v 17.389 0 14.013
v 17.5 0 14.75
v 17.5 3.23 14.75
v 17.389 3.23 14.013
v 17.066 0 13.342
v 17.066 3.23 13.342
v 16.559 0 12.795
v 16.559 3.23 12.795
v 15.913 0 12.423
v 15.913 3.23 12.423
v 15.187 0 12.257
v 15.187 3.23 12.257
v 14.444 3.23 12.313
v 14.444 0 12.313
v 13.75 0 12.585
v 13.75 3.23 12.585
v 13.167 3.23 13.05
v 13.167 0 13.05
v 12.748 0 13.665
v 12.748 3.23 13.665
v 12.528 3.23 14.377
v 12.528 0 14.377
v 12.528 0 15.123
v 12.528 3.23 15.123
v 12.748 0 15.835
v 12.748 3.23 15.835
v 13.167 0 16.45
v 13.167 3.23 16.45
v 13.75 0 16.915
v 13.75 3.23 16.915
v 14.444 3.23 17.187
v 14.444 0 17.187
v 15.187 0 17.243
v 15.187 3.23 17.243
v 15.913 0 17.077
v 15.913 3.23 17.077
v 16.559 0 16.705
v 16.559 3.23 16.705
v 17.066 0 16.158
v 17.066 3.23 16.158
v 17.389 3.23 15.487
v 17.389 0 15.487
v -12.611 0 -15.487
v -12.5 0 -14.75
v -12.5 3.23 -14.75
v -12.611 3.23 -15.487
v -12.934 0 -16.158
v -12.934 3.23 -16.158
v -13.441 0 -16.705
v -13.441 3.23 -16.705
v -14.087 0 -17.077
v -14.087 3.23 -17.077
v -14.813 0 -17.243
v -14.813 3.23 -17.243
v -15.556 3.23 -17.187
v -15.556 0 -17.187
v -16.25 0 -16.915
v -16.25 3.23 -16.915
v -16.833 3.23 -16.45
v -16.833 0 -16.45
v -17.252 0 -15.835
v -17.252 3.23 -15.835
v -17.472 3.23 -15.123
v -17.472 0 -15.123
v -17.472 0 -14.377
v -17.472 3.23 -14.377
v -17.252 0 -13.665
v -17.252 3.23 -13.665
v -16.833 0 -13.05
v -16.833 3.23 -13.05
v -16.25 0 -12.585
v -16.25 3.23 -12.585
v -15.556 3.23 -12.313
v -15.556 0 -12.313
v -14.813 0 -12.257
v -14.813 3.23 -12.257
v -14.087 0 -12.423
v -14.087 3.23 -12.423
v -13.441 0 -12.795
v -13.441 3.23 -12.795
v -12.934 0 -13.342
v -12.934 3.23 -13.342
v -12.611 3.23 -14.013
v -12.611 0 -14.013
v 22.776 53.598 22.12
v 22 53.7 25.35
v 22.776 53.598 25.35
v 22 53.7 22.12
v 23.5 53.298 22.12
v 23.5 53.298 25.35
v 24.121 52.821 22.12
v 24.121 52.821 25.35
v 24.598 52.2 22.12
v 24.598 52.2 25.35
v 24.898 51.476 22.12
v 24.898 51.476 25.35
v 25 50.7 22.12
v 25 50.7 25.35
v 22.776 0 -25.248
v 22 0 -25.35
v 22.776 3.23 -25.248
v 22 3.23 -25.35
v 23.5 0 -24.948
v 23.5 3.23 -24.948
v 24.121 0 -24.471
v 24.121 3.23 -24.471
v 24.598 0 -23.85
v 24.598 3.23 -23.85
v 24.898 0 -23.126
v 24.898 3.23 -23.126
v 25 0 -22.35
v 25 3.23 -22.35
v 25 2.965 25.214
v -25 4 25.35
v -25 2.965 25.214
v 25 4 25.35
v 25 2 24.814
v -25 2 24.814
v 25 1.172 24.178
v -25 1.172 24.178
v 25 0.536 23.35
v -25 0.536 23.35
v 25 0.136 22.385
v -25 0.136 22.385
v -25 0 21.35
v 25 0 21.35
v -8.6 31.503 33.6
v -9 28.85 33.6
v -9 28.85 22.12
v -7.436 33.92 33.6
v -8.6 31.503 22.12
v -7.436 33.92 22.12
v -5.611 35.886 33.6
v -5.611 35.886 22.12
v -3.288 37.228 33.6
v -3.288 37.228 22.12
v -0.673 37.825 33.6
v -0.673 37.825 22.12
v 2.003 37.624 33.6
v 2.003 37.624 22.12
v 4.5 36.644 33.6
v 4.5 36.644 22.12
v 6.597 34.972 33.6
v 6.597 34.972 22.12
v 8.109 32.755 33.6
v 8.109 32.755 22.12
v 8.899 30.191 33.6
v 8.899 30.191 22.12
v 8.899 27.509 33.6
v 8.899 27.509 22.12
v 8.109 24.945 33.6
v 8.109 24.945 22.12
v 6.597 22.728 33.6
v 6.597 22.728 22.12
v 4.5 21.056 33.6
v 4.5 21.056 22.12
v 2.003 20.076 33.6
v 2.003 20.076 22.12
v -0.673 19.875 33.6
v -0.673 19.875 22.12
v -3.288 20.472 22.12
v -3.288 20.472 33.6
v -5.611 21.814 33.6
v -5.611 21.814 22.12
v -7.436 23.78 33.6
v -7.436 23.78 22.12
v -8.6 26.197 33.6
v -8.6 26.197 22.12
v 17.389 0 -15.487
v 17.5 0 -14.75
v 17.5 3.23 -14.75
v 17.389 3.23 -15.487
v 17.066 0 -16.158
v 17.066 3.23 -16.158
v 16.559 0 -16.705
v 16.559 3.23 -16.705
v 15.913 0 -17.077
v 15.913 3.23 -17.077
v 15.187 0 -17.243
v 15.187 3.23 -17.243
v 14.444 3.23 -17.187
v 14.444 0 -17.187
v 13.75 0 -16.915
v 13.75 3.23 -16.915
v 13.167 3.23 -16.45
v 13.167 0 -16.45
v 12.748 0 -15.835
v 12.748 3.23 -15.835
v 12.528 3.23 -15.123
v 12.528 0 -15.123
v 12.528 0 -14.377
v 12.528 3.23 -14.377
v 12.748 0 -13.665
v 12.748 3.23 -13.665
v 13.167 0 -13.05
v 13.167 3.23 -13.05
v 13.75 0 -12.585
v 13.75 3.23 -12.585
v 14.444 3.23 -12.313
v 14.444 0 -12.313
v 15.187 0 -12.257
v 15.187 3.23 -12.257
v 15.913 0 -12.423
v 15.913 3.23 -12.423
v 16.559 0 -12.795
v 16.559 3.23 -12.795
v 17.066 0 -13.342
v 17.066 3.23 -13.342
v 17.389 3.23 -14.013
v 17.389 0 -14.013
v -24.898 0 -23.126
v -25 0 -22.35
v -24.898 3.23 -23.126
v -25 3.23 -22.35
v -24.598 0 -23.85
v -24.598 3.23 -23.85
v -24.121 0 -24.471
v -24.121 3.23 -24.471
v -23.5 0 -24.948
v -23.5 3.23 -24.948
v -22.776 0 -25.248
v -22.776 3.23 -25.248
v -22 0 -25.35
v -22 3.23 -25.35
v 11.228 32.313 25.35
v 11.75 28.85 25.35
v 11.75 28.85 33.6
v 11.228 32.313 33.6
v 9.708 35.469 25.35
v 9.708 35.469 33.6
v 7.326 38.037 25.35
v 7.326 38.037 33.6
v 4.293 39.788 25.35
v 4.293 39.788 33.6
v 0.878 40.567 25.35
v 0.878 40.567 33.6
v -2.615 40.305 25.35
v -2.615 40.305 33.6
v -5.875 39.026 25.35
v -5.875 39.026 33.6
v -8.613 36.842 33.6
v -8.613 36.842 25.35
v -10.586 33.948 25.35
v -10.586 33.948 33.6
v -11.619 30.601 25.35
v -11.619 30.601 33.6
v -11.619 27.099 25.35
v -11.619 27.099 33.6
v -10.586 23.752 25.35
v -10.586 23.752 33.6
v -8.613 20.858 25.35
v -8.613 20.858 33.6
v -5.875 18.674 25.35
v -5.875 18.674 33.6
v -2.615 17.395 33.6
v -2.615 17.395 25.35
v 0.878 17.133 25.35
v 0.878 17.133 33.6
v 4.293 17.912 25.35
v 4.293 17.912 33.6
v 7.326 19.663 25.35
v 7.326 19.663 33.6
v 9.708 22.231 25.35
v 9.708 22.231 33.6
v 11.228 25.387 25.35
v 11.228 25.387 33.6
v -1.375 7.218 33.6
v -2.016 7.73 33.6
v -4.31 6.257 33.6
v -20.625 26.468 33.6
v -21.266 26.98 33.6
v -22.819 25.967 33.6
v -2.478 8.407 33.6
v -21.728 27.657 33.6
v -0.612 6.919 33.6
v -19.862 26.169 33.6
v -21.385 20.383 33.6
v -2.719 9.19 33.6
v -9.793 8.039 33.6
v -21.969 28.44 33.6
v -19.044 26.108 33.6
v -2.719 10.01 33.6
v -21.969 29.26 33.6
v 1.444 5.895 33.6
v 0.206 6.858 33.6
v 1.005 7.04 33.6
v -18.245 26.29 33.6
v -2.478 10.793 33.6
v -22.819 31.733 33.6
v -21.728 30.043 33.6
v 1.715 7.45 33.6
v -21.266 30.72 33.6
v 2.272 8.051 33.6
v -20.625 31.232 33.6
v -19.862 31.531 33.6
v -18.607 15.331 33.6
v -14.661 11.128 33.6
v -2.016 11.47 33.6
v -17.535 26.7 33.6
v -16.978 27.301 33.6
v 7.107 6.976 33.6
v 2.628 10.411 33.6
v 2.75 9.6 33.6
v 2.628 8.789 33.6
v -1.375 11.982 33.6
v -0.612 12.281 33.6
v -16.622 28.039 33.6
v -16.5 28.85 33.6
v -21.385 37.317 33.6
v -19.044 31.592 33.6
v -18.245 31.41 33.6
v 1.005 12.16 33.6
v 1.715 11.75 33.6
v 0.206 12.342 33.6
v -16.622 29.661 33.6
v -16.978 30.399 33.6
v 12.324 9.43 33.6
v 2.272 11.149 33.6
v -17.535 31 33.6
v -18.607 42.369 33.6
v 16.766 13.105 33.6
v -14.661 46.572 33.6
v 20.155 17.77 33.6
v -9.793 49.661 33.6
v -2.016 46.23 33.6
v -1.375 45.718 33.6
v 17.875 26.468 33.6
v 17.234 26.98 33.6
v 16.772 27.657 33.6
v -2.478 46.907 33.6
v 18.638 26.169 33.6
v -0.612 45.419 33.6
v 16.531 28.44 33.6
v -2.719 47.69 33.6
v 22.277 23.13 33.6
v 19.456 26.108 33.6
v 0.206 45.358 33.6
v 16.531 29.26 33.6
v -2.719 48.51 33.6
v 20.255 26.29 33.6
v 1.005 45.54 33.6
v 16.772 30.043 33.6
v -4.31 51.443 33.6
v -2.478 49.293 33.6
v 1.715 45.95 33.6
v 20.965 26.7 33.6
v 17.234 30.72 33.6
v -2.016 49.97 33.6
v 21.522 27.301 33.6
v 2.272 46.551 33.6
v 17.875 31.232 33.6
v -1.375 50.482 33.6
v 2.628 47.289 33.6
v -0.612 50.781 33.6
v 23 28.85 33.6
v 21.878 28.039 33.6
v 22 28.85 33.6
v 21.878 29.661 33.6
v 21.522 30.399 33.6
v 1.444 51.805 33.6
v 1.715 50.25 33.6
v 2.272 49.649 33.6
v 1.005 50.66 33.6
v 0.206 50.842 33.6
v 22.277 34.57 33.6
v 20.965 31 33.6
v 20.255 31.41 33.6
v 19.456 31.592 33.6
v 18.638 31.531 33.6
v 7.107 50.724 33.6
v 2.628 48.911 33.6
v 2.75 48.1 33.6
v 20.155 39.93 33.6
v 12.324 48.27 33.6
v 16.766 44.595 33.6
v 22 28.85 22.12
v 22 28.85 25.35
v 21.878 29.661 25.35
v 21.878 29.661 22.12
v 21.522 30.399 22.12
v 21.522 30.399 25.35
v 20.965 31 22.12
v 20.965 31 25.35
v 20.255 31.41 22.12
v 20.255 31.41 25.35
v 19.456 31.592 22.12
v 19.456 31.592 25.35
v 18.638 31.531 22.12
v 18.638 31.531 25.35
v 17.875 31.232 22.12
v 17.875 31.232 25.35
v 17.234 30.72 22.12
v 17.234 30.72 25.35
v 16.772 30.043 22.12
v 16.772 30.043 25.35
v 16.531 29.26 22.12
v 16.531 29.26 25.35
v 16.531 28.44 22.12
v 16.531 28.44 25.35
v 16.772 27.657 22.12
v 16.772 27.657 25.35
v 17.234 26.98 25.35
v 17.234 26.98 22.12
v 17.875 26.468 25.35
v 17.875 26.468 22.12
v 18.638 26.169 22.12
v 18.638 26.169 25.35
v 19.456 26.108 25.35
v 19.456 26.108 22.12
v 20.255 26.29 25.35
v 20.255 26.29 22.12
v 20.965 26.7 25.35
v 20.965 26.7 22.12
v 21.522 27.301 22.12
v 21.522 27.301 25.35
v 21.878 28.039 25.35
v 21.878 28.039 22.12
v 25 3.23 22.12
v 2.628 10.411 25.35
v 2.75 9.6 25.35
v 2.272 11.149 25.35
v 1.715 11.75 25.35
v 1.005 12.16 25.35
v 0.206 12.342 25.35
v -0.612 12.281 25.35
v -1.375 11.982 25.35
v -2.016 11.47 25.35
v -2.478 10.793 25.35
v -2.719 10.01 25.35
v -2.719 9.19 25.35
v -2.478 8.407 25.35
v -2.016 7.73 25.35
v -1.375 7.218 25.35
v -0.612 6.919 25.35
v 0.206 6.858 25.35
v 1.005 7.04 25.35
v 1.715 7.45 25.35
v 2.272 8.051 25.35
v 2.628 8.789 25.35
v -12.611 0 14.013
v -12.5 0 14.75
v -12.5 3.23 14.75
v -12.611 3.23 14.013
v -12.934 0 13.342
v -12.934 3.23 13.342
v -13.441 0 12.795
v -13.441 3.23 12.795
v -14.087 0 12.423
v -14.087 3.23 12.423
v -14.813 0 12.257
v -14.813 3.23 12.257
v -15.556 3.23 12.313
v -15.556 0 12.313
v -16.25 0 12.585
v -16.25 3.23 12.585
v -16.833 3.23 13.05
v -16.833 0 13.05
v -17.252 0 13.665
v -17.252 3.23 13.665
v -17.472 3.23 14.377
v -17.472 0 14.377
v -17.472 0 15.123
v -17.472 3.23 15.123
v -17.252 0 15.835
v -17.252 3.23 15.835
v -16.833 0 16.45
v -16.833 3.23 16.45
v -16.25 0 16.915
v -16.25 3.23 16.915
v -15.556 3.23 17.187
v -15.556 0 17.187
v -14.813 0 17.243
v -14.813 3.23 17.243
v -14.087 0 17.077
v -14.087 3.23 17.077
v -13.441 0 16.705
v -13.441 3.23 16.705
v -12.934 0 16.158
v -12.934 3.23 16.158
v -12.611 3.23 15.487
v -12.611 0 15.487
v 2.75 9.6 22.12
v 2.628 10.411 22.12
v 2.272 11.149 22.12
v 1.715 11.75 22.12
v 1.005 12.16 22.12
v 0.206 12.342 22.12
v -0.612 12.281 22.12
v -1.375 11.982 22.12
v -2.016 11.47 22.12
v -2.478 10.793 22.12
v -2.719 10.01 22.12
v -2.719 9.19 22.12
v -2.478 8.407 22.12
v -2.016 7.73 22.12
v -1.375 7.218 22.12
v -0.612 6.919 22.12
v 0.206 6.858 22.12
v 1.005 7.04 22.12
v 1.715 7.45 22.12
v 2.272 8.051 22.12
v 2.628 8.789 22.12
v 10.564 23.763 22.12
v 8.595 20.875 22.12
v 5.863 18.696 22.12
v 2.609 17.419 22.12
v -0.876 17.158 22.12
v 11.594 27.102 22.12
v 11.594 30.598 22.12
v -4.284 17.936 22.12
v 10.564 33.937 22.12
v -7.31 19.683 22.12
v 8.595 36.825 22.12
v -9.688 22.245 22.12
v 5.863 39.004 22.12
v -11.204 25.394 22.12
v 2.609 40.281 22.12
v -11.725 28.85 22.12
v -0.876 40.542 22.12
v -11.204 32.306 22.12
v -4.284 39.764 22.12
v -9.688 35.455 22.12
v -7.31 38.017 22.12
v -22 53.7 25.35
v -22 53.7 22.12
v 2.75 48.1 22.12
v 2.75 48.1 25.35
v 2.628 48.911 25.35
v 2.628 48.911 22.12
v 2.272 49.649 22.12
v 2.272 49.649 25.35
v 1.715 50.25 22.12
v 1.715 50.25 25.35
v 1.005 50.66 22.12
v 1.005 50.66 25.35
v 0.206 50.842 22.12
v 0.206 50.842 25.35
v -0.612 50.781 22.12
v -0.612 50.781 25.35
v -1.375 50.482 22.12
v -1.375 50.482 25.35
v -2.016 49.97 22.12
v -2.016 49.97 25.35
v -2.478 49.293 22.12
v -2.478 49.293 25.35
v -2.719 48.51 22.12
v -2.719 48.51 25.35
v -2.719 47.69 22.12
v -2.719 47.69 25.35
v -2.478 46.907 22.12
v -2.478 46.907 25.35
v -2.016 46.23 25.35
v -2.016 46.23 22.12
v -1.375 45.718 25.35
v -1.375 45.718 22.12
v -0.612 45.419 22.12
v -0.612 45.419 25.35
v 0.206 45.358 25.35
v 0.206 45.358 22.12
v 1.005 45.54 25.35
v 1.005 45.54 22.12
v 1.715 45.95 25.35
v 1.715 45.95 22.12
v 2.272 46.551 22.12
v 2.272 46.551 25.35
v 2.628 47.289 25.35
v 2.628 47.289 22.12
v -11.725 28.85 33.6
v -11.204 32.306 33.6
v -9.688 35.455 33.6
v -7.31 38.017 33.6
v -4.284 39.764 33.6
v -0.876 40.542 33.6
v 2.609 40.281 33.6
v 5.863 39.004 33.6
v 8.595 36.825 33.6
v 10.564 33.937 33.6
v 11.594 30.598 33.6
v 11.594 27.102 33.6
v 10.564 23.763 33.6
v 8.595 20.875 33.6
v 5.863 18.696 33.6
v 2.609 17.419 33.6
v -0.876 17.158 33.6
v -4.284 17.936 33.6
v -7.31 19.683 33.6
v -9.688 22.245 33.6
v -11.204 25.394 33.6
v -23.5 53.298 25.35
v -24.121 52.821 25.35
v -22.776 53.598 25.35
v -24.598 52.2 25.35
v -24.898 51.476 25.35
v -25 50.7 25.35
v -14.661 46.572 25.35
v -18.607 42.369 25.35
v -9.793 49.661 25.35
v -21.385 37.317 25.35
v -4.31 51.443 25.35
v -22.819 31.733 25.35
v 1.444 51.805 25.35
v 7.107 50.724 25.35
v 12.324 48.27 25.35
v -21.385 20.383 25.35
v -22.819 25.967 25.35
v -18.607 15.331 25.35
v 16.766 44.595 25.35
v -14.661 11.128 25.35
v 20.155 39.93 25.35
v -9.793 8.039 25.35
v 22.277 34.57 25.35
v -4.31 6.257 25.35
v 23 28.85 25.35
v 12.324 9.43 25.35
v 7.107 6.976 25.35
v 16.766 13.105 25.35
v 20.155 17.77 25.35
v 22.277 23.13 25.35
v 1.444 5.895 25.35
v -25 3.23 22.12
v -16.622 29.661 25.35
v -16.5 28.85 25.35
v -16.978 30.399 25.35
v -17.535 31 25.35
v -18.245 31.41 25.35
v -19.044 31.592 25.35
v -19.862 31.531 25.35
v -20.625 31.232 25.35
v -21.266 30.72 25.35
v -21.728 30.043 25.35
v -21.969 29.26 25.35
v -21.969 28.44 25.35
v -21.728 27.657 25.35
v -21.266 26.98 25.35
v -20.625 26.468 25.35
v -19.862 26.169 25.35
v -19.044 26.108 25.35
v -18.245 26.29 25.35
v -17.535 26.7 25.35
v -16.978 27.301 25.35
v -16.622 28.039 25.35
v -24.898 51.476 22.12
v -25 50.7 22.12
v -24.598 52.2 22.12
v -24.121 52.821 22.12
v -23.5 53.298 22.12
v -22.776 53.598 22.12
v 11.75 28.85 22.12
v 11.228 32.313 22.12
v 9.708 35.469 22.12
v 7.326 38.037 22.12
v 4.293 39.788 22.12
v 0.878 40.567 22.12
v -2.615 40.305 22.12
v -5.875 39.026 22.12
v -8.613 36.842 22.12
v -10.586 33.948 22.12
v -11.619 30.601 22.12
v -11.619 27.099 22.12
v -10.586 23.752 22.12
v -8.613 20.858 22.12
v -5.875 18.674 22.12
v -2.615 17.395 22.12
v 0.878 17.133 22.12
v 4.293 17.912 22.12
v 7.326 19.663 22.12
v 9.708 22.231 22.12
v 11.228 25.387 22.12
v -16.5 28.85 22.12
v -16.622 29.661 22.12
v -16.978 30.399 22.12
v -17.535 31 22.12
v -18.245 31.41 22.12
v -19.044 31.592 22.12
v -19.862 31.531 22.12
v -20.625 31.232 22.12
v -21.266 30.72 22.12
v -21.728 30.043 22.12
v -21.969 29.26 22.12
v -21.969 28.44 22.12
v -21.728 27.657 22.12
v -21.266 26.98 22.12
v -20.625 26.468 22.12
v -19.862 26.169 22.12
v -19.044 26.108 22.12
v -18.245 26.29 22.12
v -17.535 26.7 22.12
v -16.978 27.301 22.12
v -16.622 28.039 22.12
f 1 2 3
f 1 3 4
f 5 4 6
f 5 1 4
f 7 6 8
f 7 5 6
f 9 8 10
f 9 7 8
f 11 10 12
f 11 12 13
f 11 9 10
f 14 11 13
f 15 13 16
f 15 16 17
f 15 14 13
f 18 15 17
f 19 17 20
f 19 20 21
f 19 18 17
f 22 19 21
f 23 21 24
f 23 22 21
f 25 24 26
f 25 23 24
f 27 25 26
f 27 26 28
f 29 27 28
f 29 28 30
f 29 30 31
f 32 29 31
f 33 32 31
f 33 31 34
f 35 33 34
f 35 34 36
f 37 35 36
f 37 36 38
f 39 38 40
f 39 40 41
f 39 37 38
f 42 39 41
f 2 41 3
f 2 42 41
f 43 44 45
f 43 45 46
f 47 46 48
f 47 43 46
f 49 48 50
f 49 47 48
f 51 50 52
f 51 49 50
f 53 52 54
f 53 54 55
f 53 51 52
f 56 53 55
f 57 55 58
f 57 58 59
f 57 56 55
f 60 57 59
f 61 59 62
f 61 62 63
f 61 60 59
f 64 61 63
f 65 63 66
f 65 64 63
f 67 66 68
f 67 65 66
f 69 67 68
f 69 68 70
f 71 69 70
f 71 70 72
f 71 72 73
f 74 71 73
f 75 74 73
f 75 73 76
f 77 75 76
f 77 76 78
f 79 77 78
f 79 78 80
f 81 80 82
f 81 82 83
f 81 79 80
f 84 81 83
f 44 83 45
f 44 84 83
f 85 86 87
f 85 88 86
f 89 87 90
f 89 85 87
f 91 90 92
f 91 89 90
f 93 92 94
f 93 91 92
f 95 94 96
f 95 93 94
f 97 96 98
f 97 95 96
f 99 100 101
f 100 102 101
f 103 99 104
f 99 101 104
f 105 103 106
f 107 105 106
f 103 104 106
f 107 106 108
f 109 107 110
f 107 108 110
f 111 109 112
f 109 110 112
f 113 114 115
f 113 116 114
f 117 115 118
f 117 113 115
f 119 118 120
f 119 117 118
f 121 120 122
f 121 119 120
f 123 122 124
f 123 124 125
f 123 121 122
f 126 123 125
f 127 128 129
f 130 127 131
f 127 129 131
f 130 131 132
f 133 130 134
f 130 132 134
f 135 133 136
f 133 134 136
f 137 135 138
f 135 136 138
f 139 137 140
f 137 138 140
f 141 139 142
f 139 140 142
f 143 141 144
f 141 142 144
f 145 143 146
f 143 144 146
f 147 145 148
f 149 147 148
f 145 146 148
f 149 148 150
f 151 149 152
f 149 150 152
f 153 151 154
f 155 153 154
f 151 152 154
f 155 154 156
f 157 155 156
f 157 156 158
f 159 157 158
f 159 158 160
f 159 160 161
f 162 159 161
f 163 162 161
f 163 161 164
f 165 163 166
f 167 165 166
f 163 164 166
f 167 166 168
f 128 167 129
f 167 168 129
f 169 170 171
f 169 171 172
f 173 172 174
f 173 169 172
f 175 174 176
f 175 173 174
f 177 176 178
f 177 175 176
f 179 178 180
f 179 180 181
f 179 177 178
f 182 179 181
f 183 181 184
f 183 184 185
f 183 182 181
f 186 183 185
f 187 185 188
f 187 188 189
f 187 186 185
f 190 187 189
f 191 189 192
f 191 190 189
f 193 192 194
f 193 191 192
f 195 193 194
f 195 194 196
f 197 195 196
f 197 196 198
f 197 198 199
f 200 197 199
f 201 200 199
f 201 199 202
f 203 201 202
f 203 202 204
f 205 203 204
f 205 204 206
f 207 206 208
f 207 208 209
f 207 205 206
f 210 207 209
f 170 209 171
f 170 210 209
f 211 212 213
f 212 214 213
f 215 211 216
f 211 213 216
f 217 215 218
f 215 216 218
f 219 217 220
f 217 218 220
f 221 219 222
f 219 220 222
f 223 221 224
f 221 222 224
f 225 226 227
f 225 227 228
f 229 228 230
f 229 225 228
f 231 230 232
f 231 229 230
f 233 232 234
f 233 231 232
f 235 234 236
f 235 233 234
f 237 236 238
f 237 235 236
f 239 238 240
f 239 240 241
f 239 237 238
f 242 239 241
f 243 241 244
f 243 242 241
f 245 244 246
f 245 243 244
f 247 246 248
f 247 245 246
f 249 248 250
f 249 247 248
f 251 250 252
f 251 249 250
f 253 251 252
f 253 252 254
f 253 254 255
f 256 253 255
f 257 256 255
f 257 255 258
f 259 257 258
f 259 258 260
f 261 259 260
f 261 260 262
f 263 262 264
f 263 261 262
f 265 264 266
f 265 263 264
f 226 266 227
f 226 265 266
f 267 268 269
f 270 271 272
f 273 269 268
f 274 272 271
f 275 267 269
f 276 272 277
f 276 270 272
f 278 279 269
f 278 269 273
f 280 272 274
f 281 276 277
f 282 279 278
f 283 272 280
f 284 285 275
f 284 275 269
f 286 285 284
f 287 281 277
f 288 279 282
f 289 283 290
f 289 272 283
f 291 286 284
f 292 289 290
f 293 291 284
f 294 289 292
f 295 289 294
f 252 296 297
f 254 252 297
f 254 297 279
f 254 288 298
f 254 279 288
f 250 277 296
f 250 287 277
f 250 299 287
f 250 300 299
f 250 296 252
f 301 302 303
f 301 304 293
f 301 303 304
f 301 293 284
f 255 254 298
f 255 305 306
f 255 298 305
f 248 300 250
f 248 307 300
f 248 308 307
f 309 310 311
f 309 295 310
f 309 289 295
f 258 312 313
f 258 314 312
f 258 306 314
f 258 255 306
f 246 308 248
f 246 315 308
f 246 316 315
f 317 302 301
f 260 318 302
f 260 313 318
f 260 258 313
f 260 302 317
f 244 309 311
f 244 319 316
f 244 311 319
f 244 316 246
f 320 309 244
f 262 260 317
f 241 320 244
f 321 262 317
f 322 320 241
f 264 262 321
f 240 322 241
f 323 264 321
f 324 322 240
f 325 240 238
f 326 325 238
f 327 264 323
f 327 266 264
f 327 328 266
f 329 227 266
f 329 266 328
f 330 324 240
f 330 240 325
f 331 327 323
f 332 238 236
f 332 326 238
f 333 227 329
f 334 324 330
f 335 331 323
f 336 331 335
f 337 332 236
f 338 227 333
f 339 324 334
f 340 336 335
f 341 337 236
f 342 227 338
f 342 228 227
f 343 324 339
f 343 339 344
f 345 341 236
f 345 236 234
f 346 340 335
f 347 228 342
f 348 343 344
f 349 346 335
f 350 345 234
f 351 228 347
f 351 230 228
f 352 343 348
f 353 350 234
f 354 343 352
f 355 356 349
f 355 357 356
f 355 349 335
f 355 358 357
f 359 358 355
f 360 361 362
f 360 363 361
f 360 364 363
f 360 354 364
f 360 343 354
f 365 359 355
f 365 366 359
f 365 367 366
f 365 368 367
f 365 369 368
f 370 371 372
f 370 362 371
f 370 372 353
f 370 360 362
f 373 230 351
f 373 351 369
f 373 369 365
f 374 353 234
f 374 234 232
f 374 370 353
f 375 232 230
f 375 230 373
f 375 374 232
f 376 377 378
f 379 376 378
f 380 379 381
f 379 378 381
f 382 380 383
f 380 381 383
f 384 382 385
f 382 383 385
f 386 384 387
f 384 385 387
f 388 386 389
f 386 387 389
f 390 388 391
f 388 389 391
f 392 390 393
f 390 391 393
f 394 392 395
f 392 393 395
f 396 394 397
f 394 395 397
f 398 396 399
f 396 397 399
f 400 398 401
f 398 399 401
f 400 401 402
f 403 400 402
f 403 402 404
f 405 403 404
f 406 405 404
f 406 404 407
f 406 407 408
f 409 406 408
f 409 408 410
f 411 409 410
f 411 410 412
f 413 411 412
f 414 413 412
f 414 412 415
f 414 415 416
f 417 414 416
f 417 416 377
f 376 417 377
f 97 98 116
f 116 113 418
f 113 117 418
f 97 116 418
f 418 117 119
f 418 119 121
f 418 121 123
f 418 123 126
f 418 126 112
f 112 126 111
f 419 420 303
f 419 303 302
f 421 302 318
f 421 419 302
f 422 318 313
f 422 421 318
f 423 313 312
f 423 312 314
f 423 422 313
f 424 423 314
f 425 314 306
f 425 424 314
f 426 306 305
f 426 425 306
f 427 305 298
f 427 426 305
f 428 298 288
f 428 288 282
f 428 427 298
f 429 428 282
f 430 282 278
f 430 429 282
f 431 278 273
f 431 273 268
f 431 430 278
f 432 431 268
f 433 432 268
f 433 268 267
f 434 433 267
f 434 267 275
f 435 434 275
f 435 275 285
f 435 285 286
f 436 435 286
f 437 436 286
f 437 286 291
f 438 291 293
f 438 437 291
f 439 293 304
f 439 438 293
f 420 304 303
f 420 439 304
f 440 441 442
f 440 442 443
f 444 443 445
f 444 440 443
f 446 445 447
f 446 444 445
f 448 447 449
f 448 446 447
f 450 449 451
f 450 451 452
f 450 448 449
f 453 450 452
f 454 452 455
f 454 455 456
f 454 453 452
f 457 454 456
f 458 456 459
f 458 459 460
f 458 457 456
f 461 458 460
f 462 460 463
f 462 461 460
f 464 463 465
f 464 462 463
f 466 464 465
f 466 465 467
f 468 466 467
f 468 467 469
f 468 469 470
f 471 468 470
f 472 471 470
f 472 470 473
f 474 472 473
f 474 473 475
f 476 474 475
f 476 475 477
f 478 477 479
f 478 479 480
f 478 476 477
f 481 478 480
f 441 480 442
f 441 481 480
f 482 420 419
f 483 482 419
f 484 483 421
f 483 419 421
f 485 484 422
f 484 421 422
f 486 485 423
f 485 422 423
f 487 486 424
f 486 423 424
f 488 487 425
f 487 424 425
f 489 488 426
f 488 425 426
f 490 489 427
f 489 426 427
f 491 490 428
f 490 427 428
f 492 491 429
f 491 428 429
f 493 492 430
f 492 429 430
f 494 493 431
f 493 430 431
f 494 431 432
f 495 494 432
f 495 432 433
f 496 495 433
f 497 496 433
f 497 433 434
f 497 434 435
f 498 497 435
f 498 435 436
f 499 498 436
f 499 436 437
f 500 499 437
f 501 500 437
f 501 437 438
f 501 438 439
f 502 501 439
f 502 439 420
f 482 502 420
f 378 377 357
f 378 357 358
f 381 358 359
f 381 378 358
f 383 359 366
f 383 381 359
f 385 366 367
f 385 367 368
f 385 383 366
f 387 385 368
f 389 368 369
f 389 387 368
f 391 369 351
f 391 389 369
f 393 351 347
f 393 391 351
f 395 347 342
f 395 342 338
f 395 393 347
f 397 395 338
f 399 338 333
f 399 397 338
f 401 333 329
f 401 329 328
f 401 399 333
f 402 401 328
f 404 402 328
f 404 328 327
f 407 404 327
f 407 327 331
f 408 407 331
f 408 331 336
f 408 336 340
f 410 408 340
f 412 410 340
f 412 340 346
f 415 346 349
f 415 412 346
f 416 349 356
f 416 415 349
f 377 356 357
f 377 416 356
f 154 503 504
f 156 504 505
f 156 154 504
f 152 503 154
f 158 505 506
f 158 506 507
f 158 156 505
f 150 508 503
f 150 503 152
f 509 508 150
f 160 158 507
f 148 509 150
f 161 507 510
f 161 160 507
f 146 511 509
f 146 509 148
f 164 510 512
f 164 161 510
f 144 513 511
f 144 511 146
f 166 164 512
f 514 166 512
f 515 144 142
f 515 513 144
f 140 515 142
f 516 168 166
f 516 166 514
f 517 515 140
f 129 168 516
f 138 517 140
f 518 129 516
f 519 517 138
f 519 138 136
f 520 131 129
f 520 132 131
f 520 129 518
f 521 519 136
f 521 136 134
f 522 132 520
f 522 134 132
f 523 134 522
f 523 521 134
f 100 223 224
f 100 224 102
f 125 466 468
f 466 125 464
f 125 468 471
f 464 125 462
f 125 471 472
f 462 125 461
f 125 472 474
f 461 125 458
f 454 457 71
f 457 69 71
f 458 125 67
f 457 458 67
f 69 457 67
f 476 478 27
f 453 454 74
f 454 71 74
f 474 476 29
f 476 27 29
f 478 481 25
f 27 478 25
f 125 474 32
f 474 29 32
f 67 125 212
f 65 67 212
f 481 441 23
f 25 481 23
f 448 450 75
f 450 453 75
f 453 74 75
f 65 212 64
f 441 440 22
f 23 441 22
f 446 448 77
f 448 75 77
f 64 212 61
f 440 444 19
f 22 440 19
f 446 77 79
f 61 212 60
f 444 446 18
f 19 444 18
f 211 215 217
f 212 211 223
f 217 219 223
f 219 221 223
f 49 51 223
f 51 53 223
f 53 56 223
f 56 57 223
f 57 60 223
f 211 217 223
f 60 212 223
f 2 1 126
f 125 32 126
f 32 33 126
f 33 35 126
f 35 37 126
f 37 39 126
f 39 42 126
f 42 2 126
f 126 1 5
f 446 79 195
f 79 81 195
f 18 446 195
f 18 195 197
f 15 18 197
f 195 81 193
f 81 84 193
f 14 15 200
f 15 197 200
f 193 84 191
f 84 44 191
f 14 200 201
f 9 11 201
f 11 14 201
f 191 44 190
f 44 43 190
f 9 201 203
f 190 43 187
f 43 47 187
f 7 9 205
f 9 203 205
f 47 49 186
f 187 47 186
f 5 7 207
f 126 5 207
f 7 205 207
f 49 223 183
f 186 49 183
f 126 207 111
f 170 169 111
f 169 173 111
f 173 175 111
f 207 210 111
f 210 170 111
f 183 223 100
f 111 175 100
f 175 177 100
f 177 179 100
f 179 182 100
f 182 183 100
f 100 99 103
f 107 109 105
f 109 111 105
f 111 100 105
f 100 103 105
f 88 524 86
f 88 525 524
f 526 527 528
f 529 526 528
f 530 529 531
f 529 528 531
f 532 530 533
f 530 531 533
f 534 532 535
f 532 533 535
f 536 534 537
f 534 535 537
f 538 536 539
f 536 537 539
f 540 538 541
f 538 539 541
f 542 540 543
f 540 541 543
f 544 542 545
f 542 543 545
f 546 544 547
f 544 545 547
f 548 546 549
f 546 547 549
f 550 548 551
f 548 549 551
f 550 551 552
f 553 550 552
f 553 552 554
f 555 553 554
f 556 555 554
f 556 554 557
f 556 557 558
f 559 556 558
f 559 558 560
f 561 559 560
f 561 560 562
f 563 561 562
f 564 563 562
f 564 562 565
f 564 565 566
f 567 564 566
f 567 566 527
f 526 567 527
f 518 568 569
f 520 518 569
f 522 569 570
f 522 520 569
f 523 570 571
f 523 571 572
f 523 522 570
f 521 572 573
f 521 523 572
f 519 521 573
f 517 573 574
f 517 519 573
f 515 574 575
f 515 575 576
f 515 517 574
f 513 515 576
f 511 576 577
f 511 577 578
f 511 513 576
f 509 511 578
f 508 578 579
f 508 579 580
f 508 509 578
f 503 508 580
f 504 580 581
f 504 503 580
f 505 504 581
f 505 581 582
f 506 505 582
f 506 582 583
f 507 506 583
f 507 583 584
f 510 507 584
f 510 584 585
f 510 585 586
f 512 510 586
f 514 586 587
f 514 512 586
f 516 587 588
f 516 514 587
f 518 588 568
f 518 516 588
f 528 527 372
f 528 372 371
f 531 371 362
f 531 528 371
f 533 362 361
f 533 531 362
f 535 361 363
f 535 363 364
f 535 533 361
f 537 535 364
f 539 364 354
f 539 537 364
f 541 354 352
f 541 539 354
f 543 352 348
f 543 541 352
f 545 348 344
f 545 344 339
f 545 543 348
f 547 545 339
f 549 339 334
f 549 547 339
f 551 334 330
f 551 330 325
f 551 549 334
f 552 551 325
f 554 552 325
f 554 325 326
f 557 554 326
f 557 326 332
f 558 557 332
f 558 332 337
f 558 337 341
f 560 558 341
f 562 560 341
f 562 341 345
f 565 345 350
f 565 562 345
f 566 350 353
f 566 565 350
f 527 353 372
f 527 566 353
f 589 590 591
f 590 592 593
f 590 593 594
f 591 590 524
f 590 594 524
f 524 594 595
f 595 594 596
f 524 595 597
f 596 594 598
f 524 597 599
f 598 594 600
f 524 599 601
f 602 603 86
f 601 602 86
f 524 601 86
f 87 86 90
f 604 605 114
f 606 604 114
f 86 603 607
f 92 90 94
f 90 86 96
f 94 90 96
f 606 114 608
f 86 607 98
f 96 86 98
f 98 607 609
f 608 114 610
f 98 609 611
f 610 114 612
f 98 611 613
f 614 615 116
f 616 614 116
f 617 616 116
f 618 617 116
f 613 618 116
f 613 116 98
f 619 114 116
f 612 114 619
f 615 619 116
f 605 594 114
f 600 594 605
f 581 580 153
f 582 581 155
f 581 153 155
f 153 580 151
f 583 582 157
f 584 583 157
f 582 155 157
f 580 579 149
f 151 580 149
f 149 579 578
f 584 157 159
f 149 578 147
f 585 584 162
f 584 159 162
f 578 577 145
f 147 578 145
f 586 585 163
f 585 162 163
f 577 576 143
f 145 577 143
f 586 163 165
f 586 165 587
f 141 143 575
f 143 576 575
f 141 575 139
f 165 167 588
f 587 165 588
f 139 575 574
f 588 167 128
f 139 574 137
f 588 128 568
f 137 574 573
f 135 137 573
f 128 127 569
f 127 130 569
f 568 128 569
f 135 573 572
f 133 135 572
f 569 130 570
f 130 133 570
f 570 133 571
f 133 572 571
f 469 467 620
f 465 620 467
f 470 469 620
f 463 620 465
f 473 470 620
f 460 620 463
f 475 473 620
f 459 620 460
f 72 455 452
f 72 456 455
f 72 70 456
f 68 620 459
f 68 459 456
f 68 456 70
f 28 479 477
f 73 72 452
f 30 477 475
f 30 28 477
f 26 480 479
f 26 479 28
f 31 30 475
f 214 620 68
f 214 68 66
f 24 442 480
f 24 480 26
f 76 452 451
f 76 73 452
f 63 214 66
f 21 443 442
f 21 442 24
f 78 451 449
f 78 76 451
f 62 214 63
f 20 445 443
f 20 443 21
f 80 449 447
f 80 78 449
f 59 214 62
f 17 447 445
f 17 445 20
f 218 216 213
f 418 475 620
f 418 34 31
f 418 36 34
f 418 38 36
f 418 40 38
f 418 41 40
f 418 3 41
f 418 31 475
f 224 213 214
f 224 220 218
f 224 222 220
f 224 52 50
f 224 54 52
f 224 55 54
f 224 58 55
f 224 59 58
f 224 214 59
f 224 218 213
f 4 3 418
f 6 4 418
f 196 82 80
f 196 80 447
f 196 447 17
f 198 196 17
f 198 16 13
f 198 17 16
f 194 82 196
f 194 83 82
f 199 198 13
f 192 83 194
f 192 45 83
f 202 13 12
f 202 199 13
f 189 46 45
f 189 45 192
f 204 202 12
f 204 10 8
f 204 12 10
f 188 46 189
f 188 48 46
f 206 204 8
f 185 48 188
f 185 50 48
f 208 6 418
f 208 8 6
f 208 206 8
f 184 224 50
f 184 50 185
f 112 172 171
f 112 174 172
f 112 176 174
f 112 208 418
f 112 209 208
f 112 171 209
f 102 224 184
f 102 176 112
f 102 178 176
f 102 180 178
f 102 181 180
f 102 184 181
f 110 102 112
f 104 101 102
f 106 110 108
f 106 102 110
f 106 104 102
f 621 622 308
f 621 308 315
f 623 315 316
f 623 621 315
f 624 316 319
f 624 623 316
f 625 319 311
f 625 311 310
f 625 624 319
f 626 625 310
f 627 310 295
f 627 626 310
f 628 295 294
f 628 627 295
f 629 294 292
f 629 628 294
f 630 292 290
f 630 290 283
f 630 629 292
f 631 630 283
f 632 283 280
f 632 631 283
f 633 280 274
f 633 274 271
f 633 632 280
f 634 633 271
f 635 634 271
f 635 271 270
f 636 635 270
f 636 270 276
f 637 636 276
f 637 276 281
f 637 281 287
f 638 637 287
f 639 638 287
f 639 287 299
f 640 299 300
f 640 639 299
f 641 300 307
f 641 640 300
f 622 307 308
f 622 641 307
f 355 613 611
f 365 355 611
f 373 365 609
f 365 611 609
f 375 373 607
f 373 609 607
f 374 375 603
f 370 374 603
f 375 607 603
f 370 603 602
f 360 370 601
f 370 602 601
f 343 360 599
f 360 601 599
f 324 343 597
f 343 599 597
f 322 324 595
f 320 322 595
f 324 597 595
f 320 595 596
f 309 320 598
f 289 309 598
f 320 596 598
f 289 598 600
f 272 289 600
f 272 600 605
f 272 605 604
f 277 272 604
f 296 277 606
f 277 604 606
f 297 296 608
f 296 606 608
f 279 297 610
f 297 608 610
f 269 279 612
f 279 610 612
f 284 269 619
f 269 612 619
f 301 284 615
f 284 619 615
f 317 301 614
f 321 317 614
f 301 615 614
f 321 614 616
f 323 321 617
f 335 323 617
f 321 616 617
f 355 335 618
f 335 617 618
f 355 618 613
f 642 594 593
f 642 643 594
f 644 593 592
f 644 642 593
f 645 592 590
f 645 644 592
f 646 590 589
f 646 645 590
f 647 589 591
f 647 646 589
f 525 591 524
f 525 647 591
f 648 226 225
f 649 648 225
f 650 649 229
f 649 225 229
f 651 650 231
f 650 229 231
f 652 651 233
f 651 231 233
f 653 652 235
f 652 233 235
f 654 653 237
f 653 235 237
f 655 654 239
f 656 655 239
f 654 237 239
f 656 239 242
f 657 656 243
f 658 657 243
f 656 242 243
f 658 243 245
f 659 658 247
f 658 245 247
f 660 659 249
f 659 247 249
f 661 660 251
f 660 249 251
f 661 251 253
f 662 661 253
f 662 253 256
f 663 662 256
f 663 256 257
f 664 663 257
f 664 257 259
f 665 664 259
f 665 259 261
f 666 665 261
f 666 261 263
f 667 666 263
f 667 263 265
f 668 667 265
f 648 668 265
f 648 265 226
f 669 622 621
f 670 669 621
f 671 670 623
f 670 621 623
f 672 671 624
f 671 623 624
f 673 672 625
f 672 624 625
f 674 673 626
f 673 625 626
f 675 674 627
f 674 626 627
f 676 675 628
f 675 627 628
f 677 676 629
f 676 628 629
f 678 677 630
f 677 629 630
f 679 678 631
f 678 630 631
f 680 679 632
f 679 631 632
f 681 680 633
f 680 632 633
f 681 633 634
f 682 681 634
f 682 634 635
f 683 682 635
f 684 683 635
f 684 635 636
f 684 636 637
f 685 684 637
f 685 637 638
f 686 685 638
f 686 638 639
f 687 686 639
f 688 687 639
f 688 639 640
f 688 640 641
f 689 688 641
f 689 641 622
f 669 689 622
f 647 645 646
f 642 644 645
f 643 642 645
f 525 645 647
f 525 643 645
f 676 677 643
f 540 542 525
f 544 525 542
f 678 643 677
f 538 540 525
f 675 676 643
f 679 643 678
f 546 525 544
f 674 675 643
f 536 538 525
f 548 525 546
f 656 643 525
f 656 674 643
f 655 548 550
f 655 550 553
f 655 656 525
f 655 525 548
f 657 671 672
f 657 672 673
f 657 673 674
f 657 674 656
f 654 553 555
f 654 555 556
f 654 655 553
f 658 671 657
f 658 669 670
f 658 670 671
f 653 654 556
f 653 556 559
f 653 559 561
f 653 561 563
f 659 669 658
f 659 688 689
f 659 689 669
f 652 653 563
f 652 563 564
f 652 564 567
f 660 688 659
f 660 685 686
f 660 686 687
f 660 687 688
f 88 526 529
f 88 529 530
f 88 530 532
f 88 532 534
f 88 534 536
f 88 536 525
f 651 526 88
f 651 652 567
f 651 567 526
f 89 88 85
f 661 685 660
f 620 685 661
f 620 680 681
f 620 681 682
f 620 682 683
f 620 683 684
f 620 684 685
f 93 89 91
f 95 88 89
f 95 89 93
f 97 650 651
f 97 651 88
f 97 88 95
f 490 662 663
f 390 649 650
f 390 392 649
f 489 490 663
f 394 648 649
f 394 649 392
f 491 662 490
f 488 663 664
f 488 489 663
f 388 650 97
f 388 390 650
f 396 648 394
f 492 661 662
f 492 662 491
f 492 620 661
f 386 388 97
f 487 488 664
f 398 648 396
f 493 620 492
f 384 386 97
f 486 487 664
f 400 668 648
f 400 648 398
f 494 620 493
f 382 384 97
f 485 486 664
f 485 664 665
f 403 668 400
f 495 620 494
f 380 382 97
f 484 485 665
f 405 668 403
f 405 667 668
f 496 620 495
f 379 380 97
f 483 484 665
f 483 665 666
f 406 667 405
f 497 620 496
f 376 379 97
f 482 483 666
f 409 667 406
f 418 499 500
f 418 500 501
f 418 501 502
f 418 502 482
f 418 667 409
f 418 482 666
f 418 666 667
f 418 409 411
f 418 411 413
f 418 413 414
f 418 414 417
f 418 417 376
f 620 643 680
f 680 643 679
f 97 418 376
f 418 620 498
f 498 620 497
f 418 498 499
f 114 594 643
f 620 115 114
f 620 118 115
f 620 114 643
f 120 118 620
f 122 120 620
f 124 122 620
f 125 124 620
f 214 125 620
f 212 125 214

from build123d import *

# Parameters (mm, degrees)
SKETCH1_W               = 50
SKETCH1_H               = 50.7
SKETCH1_R               = 2.5
BOSS_EXTRUDE1_DEPTH     = 3.23
SKETCH2_W               = 50
SKETCH2_H               = 3.23
BOSS_EXTRUDE2_DEPTH     = 50.47
FILLET1_R               = 4
FILLET2_R               = 3
SKETCH4_R               = 2.75
SKETCH4_R_2             = 11.75
CUT_EXTRUDE1_DEPTH      = 1
CUT_EXTRUDE1_DEPTH_BACK = 51.7
SKETCH4_3_R             = 23
SKETCH4_3_R_2           = 2.75
SKETCH4_3_R_3           = 11.75
BOSS_EXTRUDE3_DEPTH     = 8.25
SKETCH5_R               = 11.725
SKETCH5_R_2             = 9
BOSS_EXTRUDE4_DEPTH     = 11.48


with BuildPart() as part:
    # Sketch1 → Boss-Extrude1 (new body)
    with BuildSketch(Plane(origin=(0, 0, 0), x_dir=(1, 0, 0), z_dir=(0, 1, 0))):
        Rectangle(SKETCH1_W, SKETCH1_H)
        with Locations((15, -14.75)):
            Circle(SKETCH1_R, mode=Mode.SUBTRACT)
        with Locations((15, 14.75)):
            Circle(SKETCH1_R, mode=Mode.SUBTRACT)
        with Locations((-15, -14.75)):
            Circle(SKETCH1_R, mode=Mode.SUBTRACT)
        with Locations((-15, 14.75)):
            Circle(SKETCH1_R, mode=Mode.SUBTRACT)
    extrude(amount=BOSS_EXTRUDE1_DEPTH)

    # Sketch2 → Boss-Extrude2 (add)
    with BuildSketch(Plane(origin=(0, 3.23, 0), x_dir=(1, 0, 0), z_dir=(0, 1, 0))):
        with Locations((0, -23.735)):
            Rectangle(SKETCH2_W, SKETCH2_H)
    extrude(amount=BOSS_EXTRUDE2_DEPTH)

    # Fillet1
    fillet1_edges = [part.edges().sort_by_distance(p)[0] for p in [
        (0, 0, 25.35),
    ]]
    fillet(fillet1_edges, radius=FILLET1_R)

    # Fillet2
    fillet2_edges = [part.edges().sort_by_distance(p)[0] for p in [
        (-25, 53.7, 23.735),
        (25, 53.7, 23.735),
        (-25, 1.615, -25.35),
        (25, 1.615, -25.35),
    ]]
    fillet(fillet2_edges, radius=FILLET2_R)

    # Sketch4 → Cut-Extrude1 (cut, two sides)
    with BuildSketch(Plane.XY.offset(25.35)) as cut_extrude1_sk:
        with Locations((-19.25, 28.85)):
            Circle(SKETCH4_R)
        with Locations((19.25, 28.85)):
            Circle(SKETCH4_R)
        with Locations((0, 48.1)):
            Circle(SKETCH4_R)
        with Locations((0, 9.6)):
            Circle(SKETCH4_R)
        with Locations((0, 28.85)):
            Circle(SKETCH4_R_2)
    extrude(amount=CUT_EXTRUDE1_DEPTH, mode=Mode.SUBTRACT)
    extrude(cut_extrude1_sk.sketch, amount=-CUT_EXTRUDE1_DEPTH_BACK, mode=Mode.SUBTRACT)

    # Sketch4<3> → Boss-Extrude3 (add)
    with BuildSketch(Plane.XY.offset(25.35)):
        with Locations((0, 28.85)):
            Circle(SKETCH4_3_R)
        with Locations((0, 48.1)):
            Circle(SKETCH4_3_R_2, mode=Mode.SUBTRACT)
        with Locations((19.25, 28.85)):
            Circle(SKETCH4_3_R_2, mode=Mode.SUBTRACT)
        with Locations((0, 9.6)):
            Circle(SKETCH4_3_R_2, mode=Mode.SUBTRACT)
        with Locations((-19.25, 28.85)):
            Circle(SKETCH4_3_R_2, mode=Mode.SUBTRACT)
        with Locations((0, 28.85)):
            Circle(SKETCH4_3_R_3, mode=Mode.SUBTRACT)
    extrude(amount=BOSS_EXTRUDE3_DEPTH)


with BuildPart() as body_2:
    # Sketch5 → Boss-Extrude4 (new body)
    with BuildSketch(Plane(origin=(0, 0, 22.12), x_dir=(-1, 0, 0), z_dir=(0, 0, -1))):
        with Locations((0, 28.85)):
            Circle(SKETCH5_R)
        with Locations((0, 28.85)):
            Circle(SKETCH5_R_2, mode=Mode.SUBTRACT)
    extrude(amount=-BOSS_EXTRUDE4_DEPTH)


solid = Compound([part.part, body_2.part])
